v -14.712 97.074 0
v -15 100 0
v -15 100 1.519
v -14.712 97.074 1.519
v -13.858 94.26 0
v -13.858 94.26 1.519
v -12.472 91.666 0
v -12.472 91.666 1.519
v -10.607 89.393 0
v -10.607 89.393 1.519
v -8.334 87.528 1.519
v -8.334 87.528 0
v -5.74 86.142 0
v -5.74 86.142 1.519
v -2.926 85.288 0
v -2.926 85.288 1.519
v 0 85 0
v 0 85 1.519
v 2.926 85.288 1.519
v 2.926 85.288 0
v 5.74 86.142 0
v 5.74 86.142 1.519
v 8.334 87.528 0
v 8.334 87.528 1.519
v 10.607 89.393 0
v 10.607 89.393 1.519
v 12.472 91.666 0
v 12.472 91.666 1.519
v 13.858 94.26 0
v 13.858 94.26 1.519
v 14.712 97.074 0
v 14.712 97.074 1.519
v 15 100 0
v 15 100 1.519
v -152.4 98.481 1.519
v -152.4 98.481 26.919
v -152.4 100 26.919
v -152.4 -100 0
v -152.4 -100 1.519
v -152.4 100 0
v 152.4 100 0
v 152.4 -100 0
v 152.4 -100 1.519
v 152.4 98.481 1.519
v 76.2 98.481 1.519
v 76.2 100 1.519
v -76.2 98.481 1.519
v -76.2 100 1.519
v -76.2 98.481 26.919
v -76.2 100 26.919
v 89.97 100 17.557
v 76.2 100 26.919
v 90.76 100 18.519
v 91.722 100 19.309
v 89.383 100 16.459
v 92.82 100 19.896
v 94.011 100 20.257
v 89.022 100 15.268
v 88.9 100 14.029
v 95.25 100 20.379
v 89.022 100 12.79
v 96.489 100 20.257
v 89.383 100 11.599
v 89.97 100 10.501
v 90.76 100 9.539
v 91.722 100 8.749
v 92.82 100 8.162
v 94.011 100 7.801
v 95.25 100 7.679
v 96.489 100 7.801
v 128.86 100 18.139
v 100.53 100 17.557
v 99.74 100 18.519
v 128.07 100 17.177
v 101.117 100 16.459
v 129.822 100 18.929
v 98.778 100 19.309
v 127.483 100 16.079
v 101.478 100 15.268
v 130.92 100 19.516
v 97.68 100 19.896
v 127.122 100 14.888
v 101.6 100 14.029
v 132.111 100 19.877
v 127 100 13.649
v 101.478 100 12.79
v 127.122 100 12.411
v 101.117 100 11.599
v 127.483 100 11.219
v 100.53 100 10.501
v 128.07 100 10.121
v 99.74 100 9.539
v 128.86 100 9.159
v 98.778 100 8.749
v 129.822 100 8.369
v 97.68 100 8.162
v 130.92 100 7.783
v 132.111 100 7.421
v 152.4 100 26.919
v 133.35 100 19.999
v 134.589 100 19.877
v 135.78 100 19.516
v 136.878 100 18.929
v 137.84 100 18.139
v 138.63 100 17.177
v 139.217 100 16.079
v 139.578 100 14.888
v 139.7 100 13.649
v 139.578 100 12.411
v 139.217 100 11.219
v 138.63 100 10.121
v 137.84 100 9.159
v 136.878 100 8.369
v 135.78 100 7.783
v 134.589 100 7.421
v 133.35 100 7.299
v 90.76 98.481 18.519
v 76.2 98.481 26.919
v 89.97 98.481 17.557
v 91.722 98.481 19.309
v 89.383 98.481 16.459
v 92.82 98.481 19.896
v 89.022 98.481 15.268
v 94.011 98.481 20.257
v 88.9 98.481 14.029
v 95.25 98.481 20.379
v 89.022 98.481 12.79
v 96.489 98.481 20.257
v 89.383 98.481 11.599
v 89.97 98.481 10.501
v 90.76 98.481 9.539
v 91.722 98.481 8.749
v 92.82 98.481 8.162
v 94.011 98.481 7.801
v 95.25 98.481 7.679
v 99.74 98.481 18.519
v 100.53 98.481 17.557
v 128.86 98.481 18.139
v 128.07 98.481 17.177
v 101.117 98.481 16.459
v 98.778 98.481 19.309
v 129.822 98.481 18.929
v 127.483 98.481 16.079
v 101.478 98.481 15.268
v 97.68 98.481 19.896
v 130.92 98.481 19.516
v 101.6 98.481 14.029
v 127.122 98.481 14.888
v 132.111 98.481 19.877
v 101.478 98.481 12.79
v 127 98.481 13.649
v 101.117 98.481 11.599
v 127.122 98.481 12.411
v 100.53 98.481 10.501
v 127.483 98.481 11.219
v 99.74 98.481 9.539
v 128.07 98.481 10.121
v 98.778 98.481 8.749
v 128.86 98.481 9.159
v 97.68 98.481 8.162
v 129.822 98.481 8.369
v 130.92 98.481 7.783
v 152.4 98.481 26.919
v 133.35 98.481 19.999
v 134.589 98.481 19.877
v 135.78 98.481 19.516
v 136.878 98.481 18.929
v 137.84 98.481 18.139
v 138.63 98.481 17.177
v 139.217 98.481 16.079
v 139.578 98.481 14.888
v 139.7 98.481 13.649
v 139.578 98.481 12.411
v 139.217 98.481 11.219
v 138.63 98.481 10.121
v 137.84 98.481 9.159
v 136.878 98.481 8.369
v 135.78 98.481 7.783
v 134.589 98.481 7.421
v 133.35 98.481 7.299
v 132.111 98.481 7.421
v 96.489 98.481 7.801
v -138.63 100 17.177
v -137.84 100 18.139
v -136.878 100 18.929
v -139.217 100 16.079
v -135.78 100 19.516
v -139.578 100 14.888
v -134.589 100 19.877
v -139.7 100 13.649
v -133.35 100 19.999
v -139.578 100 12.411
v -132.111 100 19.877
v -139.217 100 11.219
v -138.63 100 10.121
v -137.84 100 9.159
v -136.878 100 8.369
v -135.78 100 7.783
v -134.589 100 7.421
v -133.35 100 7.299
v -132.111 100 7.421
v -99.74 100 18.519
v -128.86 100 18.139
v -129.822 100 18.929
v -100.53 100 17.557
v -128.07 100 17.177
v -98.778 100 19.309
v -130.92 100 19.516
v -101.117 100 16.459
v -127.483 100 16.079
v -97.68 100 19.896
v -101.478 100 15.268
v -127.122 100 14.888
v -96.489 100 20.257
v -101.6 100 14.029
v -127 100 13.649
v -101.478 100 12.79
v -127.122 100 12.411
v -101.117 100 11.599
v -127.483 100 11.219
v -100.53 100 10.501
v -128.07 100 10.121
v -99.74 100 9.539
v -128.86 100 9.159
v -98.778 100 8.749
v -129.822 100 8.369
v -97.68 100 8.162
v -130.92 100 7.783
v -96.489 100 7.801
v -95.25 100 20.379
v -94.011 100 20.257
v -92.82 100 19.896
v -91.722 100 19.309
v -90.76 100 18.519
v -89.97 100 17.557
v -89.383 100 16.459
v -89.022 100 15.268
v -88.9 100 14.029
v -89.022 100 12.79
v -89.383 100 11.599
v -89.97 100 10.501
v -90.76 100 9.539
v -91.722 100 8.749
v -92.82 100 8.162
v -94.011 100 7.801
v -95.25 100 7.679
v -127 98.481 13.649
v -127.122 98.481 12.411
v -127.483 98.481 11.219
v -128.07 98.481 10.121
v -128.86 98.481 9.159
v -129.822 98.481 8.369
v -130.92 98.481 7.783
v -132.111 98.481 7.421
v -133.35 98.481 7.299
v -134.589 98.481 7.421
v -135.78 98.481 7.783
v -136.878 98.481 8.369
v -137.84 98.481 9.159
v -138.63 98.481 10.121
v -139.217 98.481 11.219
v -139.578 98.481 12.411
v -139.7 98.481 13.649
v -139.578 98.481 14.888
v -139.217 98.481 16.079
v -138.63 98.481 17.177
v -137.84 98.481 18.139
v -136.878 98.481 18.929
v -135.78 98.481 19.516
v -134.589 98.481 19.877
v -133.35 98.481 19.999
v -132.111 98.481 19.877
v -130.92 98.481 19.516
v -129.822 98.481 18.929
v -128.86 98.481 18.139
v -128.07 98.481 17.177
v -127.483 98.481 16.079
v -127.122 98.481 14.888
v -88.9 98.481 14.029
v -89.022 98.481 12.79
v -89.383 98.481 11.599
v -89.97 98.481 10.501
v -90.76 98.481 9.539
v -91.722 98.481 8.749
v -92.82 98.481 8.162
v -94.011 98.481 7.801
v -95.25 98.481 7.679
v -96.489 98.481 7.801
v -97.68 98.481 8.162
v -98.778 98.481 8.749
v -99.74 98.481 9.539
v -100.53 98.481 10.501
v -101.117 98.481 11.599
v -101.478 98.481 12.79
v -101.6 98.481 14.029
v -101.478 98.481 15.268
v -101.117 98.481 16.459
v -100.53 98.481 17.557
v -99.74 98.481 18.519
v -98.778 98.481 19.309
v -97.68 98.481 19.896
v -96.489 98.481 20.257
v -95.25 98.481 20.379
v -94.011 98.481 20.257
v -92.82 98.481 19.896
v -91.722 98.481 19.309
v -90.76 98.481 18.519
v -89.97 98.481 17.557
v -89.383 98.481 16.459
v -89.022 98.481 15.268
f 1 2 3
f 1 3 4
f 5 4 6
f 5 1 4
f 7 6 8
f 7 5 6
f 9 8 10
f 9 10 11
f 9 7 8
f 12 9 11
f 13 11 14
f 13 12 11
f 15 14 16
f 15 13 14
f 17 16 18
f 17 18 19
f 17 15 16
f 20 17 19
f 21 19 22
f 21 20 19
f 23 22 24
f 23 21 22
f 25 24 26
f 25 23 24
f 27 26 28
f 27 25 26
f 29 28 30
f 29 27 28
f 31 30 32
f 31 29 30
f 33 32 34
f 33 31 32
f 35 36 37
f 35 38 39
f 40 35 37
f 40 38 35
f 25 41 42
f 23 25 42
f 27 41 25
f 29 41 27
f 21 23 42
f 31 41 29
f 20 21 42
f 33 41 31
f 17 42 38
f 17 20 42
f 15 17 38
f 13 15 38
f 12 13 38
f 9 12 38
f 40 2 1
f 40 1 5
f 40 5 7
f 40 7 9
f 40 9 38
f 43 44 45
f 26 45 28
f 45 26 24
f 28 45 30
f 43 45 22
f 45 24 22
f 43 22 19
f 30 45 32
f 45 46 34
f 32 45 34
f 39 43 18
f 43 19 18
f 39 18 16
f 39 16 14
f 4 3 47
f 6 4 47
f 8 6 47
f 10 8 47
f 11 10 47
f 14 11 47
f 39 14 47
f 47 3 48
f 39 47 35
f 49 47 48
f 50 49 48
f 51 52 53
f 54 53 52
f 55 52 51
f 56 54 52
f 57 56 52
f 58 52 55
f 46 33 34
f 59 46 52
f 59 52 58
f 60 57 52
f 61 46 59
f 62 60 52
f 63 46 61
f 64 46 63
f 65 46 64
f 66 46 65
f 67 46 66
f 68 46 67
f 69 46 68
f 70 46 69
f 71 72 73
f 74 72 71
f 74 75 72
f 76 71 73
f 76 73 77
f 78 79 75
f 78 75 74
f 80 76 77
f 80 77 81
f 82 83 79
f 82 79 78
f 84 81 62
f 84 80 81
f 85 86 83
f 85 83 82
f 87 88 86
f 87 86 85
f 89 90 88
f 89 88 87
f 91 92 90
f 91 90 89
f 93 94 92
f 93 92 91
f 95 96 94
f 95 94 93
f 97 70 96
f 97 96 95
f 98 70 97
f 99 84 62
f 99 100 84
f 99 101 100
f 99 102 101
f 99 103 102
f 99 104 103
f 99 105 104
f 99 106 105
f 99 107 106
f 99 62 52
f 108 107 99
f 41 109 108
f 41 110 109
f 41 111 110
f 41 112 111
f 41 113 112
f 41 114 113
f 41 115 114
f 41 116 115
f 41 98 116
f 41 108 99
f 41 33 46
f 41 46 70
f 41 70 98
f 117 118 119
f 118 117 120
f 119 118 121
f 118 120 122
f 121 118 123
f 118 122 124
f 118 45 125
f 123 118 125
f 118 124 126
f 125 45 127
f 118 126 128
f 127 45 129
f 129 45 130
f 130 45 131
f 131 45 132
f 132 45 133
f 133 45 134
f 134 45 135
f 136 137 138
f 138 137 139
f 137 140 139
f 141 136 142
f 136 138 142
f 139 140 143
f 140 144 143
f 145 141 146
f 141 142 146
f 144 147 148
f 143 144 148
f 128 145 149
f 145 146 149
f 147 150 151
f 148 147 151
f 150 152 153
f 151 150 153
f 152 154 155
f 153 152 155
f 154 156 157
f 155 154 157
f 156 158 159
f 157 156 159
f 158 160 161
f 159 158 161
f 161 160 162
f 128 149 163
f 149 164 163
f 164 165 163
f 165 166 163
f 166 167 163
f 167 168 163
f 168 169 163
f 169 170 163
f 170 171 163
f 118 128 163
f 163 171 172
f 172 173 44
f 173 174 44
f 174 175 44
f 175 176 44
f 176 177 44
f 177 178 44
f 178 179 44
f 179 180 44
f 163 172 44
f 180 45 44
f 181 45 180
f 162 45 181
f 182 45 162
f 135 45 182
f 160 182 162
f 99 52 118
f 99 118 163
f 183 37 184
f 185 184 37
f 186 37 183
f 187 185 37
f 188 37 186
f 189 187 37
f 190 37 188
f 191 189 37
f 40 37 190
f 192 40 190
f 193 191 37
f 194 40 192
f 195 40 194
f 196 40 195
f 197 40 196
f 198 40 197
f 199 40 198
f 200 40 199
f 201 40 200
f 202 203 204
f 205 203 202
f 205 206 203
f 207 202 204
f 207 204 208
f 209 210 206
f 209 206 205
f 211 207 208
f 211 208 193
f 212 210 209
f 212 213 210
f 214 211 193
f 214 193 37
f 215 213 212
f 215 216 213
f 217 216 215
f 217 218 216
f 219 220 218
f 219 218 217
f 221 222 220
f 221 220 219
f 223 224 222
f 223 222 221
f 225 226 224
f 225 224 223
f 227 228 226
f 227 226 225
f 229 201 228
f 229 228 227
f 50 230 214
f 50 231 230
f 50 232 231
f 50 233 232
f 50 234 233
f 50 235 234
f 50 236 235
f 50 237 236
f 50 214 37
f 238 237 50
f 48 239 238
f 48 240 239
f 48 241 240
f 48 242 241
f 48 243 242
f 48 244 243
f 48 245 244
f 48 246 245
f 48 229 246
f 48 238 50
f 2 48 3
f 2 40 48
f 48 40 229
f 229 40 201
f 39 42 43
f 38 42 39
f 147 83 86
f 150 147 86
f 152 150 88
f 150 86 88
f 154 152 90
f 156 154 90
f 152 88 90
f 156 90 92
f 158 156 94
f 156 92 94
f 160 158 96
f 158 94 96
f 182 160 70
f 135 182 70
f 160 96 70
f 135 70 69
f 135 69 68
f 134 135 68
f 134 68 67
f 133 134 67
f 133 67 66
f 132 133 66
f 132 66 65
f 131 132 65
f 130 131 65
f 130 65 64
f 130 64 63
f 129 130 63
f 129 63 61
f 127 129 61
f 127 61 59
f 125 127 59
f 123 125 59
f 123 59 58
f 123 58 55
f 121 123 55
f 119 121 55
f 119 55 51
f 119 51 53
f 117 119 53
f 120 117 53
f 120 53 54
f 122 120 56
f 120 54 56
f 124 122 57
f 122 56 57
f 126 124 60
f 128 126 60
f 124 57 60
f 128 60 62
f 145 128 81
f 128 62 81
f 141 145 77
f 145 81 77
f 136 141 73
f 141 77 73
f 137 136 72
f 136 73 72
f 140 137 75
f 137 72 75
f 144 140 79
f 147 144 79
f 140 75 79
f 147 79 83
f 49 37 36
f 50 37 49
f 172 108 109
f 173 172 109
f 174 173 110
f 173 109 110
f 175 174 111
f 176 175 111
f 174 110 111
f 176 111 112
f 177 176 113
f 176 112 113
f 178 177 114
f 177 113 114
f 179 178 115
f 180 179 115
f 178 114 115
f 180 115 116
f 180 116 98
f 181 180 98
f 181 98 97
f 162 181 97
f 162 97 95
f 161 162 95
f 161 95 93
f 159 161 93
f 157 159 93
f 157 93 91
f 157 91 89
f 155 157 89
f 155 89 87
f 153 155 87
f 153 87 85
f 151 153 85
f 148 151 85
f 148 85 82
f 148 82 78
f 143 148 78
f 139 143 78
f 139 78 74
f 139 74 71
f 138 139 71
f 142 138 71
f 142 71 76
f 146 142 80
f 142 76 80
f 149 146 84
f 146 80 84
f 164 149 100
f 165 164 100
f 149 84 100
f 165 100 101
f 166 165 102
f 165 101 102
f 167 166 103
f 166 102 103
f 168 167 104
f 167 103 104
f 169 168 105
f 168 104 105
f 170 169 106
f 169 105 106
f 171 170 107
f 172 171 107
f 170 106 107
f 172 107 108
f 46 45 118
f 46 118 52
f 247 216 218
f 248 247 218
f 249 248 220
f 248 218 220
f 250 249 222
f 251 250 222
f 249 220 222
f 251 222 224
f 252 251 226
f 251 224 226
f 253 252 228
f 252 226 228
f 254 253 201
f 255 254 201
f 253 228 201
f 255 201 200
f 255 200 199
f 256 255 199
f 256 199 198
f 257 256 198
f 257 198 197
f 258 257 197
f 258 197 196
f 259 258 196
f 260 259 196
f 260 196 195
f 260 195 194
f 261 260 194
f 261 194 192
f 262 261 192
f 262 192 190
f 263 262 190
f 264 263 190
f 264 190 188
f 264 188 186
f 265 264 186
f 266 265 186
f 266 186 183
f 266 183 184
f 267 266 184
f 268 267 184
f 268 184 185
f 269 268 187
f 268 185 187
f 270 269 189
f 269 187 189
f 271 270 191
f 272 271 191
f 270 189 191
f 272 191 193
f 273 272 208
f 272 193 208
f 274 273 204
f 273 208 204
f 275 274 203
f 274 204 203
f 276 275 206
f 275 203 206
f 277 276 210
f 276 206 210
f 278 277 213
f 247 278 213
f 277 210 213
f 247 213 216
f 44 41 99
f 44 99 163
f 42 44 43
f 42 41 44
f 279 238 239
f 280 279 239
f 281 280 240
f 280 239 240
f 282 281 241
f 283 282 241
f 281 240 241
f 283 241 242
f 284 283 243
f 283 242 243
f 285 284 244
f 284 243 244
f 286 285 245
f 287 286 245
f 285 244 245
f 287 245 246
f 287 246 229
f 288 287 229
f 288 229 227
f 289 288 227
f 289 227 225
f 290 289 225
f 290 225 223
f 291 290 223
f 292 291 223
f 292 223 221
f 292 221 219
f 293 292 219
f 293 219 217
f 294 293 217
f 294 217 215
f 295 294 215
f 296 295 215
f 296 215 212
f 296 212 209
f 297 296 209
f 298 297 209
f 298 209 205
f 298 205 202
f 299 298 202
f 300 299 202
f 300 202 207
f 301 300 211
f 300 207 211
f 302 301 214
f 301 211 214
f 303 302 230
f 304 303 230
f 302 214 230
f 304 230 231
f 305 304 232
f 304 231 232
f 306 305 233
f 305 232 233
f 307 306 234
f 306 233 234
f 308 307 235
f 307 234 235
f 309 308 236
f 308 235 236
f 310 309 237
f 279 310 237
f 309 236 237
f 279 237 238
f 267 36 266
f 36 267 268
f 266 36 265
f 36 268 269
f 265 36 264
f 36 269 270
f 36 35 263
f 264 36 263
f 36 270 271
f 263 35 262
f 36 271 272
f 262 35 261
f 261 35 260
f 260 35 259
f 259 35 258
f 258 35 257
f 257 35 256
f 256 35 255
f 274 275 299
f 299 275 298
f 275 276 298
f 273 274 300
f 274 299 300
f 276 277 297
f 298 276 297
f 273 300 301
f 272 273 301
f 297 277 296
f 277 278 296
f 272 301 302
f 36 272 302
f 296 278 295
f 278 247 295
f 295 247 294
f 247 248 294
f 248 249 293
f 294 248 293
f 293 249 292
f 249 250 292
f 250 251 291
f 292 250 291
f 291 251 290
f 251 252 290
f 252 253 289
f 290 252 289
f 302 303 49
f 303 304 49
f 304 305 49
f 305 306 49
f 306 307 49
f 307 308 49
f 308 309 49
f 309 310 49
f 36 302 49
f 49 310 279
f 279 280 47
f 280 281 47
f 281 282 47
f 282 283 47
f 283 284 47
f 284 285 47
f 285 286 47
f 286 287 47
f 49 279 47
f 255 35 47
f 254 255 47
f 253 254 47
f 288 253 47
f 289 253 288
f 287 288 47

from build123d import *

# Parameters (mm, degrees)
BOTTOM_CENTER_CASING_DEPTH = 1.51892
SKETCH3_W                  = 76.2
SKETCH3_H                  = 1.51892
BOSS_EXTRUDE1_DEPTH        = 25.4
SKETCH4_R                  = 6.35
CUT_EXTRUDE1_DEPTH         = 25.4


with BuildPart() as part:
    # Sketch1 → Bottom Center Casing (new body)
    with BuildSketch(Plane.XY):
        with BuildLine():
            Line((-152.4, 100), (-15, 100))
            ThreePointArc((-15, 100), (0, 85), (15, 100))
            Line((15, 100), (152.4, 100))
            Line((152.4, 100), (152.4, -100))
            Line((152.4, -100), (-152.4, -100))
            Line((-152.4, -100), (-152.4, 100))
        make_face()
    extrude(amount=BOTTOM_CENTER_CASING_DEPTH)

    # Sketch3 → Boss-Extrude1 (add)
    with BuildSketch(Plane.XY.offset(1.51892)):
        with Locations((-114.3, 99.24054)):
            Rectangle(SKETCH3_W, SKETCH3_H)
        with Locations((114.3, 99.24054)):
            Rectangle(SKETCH3_W, SKETCH3_H)
    extrude(amount=BOSS_EXTRUDE1_DEPTH)

    # Sketch4 → Cut-Extrude1 (cut)
    with BuildSketch(Plane(origin=(0, 100, 0), x_dir=(1, 0, 0), z_dir=(0, 1, 0))):
        with Locations((-133.35, -13.649325)):
            Circle(SKETCH4_R)
        with Locations((-95.25, -14.029055)):
            Circle(SKETCH4_R)
        with Locations((95.25, -14.029055)):
            Circle(SKETCH4_R)
        with Locations((133.35, -13.649325)):
            Circle(SKETCH4_R)
    extrude(amount=-CUT_EXTRUDE1_DEPTH, mode=Mode.SUBTRACT)


solid = part.part
